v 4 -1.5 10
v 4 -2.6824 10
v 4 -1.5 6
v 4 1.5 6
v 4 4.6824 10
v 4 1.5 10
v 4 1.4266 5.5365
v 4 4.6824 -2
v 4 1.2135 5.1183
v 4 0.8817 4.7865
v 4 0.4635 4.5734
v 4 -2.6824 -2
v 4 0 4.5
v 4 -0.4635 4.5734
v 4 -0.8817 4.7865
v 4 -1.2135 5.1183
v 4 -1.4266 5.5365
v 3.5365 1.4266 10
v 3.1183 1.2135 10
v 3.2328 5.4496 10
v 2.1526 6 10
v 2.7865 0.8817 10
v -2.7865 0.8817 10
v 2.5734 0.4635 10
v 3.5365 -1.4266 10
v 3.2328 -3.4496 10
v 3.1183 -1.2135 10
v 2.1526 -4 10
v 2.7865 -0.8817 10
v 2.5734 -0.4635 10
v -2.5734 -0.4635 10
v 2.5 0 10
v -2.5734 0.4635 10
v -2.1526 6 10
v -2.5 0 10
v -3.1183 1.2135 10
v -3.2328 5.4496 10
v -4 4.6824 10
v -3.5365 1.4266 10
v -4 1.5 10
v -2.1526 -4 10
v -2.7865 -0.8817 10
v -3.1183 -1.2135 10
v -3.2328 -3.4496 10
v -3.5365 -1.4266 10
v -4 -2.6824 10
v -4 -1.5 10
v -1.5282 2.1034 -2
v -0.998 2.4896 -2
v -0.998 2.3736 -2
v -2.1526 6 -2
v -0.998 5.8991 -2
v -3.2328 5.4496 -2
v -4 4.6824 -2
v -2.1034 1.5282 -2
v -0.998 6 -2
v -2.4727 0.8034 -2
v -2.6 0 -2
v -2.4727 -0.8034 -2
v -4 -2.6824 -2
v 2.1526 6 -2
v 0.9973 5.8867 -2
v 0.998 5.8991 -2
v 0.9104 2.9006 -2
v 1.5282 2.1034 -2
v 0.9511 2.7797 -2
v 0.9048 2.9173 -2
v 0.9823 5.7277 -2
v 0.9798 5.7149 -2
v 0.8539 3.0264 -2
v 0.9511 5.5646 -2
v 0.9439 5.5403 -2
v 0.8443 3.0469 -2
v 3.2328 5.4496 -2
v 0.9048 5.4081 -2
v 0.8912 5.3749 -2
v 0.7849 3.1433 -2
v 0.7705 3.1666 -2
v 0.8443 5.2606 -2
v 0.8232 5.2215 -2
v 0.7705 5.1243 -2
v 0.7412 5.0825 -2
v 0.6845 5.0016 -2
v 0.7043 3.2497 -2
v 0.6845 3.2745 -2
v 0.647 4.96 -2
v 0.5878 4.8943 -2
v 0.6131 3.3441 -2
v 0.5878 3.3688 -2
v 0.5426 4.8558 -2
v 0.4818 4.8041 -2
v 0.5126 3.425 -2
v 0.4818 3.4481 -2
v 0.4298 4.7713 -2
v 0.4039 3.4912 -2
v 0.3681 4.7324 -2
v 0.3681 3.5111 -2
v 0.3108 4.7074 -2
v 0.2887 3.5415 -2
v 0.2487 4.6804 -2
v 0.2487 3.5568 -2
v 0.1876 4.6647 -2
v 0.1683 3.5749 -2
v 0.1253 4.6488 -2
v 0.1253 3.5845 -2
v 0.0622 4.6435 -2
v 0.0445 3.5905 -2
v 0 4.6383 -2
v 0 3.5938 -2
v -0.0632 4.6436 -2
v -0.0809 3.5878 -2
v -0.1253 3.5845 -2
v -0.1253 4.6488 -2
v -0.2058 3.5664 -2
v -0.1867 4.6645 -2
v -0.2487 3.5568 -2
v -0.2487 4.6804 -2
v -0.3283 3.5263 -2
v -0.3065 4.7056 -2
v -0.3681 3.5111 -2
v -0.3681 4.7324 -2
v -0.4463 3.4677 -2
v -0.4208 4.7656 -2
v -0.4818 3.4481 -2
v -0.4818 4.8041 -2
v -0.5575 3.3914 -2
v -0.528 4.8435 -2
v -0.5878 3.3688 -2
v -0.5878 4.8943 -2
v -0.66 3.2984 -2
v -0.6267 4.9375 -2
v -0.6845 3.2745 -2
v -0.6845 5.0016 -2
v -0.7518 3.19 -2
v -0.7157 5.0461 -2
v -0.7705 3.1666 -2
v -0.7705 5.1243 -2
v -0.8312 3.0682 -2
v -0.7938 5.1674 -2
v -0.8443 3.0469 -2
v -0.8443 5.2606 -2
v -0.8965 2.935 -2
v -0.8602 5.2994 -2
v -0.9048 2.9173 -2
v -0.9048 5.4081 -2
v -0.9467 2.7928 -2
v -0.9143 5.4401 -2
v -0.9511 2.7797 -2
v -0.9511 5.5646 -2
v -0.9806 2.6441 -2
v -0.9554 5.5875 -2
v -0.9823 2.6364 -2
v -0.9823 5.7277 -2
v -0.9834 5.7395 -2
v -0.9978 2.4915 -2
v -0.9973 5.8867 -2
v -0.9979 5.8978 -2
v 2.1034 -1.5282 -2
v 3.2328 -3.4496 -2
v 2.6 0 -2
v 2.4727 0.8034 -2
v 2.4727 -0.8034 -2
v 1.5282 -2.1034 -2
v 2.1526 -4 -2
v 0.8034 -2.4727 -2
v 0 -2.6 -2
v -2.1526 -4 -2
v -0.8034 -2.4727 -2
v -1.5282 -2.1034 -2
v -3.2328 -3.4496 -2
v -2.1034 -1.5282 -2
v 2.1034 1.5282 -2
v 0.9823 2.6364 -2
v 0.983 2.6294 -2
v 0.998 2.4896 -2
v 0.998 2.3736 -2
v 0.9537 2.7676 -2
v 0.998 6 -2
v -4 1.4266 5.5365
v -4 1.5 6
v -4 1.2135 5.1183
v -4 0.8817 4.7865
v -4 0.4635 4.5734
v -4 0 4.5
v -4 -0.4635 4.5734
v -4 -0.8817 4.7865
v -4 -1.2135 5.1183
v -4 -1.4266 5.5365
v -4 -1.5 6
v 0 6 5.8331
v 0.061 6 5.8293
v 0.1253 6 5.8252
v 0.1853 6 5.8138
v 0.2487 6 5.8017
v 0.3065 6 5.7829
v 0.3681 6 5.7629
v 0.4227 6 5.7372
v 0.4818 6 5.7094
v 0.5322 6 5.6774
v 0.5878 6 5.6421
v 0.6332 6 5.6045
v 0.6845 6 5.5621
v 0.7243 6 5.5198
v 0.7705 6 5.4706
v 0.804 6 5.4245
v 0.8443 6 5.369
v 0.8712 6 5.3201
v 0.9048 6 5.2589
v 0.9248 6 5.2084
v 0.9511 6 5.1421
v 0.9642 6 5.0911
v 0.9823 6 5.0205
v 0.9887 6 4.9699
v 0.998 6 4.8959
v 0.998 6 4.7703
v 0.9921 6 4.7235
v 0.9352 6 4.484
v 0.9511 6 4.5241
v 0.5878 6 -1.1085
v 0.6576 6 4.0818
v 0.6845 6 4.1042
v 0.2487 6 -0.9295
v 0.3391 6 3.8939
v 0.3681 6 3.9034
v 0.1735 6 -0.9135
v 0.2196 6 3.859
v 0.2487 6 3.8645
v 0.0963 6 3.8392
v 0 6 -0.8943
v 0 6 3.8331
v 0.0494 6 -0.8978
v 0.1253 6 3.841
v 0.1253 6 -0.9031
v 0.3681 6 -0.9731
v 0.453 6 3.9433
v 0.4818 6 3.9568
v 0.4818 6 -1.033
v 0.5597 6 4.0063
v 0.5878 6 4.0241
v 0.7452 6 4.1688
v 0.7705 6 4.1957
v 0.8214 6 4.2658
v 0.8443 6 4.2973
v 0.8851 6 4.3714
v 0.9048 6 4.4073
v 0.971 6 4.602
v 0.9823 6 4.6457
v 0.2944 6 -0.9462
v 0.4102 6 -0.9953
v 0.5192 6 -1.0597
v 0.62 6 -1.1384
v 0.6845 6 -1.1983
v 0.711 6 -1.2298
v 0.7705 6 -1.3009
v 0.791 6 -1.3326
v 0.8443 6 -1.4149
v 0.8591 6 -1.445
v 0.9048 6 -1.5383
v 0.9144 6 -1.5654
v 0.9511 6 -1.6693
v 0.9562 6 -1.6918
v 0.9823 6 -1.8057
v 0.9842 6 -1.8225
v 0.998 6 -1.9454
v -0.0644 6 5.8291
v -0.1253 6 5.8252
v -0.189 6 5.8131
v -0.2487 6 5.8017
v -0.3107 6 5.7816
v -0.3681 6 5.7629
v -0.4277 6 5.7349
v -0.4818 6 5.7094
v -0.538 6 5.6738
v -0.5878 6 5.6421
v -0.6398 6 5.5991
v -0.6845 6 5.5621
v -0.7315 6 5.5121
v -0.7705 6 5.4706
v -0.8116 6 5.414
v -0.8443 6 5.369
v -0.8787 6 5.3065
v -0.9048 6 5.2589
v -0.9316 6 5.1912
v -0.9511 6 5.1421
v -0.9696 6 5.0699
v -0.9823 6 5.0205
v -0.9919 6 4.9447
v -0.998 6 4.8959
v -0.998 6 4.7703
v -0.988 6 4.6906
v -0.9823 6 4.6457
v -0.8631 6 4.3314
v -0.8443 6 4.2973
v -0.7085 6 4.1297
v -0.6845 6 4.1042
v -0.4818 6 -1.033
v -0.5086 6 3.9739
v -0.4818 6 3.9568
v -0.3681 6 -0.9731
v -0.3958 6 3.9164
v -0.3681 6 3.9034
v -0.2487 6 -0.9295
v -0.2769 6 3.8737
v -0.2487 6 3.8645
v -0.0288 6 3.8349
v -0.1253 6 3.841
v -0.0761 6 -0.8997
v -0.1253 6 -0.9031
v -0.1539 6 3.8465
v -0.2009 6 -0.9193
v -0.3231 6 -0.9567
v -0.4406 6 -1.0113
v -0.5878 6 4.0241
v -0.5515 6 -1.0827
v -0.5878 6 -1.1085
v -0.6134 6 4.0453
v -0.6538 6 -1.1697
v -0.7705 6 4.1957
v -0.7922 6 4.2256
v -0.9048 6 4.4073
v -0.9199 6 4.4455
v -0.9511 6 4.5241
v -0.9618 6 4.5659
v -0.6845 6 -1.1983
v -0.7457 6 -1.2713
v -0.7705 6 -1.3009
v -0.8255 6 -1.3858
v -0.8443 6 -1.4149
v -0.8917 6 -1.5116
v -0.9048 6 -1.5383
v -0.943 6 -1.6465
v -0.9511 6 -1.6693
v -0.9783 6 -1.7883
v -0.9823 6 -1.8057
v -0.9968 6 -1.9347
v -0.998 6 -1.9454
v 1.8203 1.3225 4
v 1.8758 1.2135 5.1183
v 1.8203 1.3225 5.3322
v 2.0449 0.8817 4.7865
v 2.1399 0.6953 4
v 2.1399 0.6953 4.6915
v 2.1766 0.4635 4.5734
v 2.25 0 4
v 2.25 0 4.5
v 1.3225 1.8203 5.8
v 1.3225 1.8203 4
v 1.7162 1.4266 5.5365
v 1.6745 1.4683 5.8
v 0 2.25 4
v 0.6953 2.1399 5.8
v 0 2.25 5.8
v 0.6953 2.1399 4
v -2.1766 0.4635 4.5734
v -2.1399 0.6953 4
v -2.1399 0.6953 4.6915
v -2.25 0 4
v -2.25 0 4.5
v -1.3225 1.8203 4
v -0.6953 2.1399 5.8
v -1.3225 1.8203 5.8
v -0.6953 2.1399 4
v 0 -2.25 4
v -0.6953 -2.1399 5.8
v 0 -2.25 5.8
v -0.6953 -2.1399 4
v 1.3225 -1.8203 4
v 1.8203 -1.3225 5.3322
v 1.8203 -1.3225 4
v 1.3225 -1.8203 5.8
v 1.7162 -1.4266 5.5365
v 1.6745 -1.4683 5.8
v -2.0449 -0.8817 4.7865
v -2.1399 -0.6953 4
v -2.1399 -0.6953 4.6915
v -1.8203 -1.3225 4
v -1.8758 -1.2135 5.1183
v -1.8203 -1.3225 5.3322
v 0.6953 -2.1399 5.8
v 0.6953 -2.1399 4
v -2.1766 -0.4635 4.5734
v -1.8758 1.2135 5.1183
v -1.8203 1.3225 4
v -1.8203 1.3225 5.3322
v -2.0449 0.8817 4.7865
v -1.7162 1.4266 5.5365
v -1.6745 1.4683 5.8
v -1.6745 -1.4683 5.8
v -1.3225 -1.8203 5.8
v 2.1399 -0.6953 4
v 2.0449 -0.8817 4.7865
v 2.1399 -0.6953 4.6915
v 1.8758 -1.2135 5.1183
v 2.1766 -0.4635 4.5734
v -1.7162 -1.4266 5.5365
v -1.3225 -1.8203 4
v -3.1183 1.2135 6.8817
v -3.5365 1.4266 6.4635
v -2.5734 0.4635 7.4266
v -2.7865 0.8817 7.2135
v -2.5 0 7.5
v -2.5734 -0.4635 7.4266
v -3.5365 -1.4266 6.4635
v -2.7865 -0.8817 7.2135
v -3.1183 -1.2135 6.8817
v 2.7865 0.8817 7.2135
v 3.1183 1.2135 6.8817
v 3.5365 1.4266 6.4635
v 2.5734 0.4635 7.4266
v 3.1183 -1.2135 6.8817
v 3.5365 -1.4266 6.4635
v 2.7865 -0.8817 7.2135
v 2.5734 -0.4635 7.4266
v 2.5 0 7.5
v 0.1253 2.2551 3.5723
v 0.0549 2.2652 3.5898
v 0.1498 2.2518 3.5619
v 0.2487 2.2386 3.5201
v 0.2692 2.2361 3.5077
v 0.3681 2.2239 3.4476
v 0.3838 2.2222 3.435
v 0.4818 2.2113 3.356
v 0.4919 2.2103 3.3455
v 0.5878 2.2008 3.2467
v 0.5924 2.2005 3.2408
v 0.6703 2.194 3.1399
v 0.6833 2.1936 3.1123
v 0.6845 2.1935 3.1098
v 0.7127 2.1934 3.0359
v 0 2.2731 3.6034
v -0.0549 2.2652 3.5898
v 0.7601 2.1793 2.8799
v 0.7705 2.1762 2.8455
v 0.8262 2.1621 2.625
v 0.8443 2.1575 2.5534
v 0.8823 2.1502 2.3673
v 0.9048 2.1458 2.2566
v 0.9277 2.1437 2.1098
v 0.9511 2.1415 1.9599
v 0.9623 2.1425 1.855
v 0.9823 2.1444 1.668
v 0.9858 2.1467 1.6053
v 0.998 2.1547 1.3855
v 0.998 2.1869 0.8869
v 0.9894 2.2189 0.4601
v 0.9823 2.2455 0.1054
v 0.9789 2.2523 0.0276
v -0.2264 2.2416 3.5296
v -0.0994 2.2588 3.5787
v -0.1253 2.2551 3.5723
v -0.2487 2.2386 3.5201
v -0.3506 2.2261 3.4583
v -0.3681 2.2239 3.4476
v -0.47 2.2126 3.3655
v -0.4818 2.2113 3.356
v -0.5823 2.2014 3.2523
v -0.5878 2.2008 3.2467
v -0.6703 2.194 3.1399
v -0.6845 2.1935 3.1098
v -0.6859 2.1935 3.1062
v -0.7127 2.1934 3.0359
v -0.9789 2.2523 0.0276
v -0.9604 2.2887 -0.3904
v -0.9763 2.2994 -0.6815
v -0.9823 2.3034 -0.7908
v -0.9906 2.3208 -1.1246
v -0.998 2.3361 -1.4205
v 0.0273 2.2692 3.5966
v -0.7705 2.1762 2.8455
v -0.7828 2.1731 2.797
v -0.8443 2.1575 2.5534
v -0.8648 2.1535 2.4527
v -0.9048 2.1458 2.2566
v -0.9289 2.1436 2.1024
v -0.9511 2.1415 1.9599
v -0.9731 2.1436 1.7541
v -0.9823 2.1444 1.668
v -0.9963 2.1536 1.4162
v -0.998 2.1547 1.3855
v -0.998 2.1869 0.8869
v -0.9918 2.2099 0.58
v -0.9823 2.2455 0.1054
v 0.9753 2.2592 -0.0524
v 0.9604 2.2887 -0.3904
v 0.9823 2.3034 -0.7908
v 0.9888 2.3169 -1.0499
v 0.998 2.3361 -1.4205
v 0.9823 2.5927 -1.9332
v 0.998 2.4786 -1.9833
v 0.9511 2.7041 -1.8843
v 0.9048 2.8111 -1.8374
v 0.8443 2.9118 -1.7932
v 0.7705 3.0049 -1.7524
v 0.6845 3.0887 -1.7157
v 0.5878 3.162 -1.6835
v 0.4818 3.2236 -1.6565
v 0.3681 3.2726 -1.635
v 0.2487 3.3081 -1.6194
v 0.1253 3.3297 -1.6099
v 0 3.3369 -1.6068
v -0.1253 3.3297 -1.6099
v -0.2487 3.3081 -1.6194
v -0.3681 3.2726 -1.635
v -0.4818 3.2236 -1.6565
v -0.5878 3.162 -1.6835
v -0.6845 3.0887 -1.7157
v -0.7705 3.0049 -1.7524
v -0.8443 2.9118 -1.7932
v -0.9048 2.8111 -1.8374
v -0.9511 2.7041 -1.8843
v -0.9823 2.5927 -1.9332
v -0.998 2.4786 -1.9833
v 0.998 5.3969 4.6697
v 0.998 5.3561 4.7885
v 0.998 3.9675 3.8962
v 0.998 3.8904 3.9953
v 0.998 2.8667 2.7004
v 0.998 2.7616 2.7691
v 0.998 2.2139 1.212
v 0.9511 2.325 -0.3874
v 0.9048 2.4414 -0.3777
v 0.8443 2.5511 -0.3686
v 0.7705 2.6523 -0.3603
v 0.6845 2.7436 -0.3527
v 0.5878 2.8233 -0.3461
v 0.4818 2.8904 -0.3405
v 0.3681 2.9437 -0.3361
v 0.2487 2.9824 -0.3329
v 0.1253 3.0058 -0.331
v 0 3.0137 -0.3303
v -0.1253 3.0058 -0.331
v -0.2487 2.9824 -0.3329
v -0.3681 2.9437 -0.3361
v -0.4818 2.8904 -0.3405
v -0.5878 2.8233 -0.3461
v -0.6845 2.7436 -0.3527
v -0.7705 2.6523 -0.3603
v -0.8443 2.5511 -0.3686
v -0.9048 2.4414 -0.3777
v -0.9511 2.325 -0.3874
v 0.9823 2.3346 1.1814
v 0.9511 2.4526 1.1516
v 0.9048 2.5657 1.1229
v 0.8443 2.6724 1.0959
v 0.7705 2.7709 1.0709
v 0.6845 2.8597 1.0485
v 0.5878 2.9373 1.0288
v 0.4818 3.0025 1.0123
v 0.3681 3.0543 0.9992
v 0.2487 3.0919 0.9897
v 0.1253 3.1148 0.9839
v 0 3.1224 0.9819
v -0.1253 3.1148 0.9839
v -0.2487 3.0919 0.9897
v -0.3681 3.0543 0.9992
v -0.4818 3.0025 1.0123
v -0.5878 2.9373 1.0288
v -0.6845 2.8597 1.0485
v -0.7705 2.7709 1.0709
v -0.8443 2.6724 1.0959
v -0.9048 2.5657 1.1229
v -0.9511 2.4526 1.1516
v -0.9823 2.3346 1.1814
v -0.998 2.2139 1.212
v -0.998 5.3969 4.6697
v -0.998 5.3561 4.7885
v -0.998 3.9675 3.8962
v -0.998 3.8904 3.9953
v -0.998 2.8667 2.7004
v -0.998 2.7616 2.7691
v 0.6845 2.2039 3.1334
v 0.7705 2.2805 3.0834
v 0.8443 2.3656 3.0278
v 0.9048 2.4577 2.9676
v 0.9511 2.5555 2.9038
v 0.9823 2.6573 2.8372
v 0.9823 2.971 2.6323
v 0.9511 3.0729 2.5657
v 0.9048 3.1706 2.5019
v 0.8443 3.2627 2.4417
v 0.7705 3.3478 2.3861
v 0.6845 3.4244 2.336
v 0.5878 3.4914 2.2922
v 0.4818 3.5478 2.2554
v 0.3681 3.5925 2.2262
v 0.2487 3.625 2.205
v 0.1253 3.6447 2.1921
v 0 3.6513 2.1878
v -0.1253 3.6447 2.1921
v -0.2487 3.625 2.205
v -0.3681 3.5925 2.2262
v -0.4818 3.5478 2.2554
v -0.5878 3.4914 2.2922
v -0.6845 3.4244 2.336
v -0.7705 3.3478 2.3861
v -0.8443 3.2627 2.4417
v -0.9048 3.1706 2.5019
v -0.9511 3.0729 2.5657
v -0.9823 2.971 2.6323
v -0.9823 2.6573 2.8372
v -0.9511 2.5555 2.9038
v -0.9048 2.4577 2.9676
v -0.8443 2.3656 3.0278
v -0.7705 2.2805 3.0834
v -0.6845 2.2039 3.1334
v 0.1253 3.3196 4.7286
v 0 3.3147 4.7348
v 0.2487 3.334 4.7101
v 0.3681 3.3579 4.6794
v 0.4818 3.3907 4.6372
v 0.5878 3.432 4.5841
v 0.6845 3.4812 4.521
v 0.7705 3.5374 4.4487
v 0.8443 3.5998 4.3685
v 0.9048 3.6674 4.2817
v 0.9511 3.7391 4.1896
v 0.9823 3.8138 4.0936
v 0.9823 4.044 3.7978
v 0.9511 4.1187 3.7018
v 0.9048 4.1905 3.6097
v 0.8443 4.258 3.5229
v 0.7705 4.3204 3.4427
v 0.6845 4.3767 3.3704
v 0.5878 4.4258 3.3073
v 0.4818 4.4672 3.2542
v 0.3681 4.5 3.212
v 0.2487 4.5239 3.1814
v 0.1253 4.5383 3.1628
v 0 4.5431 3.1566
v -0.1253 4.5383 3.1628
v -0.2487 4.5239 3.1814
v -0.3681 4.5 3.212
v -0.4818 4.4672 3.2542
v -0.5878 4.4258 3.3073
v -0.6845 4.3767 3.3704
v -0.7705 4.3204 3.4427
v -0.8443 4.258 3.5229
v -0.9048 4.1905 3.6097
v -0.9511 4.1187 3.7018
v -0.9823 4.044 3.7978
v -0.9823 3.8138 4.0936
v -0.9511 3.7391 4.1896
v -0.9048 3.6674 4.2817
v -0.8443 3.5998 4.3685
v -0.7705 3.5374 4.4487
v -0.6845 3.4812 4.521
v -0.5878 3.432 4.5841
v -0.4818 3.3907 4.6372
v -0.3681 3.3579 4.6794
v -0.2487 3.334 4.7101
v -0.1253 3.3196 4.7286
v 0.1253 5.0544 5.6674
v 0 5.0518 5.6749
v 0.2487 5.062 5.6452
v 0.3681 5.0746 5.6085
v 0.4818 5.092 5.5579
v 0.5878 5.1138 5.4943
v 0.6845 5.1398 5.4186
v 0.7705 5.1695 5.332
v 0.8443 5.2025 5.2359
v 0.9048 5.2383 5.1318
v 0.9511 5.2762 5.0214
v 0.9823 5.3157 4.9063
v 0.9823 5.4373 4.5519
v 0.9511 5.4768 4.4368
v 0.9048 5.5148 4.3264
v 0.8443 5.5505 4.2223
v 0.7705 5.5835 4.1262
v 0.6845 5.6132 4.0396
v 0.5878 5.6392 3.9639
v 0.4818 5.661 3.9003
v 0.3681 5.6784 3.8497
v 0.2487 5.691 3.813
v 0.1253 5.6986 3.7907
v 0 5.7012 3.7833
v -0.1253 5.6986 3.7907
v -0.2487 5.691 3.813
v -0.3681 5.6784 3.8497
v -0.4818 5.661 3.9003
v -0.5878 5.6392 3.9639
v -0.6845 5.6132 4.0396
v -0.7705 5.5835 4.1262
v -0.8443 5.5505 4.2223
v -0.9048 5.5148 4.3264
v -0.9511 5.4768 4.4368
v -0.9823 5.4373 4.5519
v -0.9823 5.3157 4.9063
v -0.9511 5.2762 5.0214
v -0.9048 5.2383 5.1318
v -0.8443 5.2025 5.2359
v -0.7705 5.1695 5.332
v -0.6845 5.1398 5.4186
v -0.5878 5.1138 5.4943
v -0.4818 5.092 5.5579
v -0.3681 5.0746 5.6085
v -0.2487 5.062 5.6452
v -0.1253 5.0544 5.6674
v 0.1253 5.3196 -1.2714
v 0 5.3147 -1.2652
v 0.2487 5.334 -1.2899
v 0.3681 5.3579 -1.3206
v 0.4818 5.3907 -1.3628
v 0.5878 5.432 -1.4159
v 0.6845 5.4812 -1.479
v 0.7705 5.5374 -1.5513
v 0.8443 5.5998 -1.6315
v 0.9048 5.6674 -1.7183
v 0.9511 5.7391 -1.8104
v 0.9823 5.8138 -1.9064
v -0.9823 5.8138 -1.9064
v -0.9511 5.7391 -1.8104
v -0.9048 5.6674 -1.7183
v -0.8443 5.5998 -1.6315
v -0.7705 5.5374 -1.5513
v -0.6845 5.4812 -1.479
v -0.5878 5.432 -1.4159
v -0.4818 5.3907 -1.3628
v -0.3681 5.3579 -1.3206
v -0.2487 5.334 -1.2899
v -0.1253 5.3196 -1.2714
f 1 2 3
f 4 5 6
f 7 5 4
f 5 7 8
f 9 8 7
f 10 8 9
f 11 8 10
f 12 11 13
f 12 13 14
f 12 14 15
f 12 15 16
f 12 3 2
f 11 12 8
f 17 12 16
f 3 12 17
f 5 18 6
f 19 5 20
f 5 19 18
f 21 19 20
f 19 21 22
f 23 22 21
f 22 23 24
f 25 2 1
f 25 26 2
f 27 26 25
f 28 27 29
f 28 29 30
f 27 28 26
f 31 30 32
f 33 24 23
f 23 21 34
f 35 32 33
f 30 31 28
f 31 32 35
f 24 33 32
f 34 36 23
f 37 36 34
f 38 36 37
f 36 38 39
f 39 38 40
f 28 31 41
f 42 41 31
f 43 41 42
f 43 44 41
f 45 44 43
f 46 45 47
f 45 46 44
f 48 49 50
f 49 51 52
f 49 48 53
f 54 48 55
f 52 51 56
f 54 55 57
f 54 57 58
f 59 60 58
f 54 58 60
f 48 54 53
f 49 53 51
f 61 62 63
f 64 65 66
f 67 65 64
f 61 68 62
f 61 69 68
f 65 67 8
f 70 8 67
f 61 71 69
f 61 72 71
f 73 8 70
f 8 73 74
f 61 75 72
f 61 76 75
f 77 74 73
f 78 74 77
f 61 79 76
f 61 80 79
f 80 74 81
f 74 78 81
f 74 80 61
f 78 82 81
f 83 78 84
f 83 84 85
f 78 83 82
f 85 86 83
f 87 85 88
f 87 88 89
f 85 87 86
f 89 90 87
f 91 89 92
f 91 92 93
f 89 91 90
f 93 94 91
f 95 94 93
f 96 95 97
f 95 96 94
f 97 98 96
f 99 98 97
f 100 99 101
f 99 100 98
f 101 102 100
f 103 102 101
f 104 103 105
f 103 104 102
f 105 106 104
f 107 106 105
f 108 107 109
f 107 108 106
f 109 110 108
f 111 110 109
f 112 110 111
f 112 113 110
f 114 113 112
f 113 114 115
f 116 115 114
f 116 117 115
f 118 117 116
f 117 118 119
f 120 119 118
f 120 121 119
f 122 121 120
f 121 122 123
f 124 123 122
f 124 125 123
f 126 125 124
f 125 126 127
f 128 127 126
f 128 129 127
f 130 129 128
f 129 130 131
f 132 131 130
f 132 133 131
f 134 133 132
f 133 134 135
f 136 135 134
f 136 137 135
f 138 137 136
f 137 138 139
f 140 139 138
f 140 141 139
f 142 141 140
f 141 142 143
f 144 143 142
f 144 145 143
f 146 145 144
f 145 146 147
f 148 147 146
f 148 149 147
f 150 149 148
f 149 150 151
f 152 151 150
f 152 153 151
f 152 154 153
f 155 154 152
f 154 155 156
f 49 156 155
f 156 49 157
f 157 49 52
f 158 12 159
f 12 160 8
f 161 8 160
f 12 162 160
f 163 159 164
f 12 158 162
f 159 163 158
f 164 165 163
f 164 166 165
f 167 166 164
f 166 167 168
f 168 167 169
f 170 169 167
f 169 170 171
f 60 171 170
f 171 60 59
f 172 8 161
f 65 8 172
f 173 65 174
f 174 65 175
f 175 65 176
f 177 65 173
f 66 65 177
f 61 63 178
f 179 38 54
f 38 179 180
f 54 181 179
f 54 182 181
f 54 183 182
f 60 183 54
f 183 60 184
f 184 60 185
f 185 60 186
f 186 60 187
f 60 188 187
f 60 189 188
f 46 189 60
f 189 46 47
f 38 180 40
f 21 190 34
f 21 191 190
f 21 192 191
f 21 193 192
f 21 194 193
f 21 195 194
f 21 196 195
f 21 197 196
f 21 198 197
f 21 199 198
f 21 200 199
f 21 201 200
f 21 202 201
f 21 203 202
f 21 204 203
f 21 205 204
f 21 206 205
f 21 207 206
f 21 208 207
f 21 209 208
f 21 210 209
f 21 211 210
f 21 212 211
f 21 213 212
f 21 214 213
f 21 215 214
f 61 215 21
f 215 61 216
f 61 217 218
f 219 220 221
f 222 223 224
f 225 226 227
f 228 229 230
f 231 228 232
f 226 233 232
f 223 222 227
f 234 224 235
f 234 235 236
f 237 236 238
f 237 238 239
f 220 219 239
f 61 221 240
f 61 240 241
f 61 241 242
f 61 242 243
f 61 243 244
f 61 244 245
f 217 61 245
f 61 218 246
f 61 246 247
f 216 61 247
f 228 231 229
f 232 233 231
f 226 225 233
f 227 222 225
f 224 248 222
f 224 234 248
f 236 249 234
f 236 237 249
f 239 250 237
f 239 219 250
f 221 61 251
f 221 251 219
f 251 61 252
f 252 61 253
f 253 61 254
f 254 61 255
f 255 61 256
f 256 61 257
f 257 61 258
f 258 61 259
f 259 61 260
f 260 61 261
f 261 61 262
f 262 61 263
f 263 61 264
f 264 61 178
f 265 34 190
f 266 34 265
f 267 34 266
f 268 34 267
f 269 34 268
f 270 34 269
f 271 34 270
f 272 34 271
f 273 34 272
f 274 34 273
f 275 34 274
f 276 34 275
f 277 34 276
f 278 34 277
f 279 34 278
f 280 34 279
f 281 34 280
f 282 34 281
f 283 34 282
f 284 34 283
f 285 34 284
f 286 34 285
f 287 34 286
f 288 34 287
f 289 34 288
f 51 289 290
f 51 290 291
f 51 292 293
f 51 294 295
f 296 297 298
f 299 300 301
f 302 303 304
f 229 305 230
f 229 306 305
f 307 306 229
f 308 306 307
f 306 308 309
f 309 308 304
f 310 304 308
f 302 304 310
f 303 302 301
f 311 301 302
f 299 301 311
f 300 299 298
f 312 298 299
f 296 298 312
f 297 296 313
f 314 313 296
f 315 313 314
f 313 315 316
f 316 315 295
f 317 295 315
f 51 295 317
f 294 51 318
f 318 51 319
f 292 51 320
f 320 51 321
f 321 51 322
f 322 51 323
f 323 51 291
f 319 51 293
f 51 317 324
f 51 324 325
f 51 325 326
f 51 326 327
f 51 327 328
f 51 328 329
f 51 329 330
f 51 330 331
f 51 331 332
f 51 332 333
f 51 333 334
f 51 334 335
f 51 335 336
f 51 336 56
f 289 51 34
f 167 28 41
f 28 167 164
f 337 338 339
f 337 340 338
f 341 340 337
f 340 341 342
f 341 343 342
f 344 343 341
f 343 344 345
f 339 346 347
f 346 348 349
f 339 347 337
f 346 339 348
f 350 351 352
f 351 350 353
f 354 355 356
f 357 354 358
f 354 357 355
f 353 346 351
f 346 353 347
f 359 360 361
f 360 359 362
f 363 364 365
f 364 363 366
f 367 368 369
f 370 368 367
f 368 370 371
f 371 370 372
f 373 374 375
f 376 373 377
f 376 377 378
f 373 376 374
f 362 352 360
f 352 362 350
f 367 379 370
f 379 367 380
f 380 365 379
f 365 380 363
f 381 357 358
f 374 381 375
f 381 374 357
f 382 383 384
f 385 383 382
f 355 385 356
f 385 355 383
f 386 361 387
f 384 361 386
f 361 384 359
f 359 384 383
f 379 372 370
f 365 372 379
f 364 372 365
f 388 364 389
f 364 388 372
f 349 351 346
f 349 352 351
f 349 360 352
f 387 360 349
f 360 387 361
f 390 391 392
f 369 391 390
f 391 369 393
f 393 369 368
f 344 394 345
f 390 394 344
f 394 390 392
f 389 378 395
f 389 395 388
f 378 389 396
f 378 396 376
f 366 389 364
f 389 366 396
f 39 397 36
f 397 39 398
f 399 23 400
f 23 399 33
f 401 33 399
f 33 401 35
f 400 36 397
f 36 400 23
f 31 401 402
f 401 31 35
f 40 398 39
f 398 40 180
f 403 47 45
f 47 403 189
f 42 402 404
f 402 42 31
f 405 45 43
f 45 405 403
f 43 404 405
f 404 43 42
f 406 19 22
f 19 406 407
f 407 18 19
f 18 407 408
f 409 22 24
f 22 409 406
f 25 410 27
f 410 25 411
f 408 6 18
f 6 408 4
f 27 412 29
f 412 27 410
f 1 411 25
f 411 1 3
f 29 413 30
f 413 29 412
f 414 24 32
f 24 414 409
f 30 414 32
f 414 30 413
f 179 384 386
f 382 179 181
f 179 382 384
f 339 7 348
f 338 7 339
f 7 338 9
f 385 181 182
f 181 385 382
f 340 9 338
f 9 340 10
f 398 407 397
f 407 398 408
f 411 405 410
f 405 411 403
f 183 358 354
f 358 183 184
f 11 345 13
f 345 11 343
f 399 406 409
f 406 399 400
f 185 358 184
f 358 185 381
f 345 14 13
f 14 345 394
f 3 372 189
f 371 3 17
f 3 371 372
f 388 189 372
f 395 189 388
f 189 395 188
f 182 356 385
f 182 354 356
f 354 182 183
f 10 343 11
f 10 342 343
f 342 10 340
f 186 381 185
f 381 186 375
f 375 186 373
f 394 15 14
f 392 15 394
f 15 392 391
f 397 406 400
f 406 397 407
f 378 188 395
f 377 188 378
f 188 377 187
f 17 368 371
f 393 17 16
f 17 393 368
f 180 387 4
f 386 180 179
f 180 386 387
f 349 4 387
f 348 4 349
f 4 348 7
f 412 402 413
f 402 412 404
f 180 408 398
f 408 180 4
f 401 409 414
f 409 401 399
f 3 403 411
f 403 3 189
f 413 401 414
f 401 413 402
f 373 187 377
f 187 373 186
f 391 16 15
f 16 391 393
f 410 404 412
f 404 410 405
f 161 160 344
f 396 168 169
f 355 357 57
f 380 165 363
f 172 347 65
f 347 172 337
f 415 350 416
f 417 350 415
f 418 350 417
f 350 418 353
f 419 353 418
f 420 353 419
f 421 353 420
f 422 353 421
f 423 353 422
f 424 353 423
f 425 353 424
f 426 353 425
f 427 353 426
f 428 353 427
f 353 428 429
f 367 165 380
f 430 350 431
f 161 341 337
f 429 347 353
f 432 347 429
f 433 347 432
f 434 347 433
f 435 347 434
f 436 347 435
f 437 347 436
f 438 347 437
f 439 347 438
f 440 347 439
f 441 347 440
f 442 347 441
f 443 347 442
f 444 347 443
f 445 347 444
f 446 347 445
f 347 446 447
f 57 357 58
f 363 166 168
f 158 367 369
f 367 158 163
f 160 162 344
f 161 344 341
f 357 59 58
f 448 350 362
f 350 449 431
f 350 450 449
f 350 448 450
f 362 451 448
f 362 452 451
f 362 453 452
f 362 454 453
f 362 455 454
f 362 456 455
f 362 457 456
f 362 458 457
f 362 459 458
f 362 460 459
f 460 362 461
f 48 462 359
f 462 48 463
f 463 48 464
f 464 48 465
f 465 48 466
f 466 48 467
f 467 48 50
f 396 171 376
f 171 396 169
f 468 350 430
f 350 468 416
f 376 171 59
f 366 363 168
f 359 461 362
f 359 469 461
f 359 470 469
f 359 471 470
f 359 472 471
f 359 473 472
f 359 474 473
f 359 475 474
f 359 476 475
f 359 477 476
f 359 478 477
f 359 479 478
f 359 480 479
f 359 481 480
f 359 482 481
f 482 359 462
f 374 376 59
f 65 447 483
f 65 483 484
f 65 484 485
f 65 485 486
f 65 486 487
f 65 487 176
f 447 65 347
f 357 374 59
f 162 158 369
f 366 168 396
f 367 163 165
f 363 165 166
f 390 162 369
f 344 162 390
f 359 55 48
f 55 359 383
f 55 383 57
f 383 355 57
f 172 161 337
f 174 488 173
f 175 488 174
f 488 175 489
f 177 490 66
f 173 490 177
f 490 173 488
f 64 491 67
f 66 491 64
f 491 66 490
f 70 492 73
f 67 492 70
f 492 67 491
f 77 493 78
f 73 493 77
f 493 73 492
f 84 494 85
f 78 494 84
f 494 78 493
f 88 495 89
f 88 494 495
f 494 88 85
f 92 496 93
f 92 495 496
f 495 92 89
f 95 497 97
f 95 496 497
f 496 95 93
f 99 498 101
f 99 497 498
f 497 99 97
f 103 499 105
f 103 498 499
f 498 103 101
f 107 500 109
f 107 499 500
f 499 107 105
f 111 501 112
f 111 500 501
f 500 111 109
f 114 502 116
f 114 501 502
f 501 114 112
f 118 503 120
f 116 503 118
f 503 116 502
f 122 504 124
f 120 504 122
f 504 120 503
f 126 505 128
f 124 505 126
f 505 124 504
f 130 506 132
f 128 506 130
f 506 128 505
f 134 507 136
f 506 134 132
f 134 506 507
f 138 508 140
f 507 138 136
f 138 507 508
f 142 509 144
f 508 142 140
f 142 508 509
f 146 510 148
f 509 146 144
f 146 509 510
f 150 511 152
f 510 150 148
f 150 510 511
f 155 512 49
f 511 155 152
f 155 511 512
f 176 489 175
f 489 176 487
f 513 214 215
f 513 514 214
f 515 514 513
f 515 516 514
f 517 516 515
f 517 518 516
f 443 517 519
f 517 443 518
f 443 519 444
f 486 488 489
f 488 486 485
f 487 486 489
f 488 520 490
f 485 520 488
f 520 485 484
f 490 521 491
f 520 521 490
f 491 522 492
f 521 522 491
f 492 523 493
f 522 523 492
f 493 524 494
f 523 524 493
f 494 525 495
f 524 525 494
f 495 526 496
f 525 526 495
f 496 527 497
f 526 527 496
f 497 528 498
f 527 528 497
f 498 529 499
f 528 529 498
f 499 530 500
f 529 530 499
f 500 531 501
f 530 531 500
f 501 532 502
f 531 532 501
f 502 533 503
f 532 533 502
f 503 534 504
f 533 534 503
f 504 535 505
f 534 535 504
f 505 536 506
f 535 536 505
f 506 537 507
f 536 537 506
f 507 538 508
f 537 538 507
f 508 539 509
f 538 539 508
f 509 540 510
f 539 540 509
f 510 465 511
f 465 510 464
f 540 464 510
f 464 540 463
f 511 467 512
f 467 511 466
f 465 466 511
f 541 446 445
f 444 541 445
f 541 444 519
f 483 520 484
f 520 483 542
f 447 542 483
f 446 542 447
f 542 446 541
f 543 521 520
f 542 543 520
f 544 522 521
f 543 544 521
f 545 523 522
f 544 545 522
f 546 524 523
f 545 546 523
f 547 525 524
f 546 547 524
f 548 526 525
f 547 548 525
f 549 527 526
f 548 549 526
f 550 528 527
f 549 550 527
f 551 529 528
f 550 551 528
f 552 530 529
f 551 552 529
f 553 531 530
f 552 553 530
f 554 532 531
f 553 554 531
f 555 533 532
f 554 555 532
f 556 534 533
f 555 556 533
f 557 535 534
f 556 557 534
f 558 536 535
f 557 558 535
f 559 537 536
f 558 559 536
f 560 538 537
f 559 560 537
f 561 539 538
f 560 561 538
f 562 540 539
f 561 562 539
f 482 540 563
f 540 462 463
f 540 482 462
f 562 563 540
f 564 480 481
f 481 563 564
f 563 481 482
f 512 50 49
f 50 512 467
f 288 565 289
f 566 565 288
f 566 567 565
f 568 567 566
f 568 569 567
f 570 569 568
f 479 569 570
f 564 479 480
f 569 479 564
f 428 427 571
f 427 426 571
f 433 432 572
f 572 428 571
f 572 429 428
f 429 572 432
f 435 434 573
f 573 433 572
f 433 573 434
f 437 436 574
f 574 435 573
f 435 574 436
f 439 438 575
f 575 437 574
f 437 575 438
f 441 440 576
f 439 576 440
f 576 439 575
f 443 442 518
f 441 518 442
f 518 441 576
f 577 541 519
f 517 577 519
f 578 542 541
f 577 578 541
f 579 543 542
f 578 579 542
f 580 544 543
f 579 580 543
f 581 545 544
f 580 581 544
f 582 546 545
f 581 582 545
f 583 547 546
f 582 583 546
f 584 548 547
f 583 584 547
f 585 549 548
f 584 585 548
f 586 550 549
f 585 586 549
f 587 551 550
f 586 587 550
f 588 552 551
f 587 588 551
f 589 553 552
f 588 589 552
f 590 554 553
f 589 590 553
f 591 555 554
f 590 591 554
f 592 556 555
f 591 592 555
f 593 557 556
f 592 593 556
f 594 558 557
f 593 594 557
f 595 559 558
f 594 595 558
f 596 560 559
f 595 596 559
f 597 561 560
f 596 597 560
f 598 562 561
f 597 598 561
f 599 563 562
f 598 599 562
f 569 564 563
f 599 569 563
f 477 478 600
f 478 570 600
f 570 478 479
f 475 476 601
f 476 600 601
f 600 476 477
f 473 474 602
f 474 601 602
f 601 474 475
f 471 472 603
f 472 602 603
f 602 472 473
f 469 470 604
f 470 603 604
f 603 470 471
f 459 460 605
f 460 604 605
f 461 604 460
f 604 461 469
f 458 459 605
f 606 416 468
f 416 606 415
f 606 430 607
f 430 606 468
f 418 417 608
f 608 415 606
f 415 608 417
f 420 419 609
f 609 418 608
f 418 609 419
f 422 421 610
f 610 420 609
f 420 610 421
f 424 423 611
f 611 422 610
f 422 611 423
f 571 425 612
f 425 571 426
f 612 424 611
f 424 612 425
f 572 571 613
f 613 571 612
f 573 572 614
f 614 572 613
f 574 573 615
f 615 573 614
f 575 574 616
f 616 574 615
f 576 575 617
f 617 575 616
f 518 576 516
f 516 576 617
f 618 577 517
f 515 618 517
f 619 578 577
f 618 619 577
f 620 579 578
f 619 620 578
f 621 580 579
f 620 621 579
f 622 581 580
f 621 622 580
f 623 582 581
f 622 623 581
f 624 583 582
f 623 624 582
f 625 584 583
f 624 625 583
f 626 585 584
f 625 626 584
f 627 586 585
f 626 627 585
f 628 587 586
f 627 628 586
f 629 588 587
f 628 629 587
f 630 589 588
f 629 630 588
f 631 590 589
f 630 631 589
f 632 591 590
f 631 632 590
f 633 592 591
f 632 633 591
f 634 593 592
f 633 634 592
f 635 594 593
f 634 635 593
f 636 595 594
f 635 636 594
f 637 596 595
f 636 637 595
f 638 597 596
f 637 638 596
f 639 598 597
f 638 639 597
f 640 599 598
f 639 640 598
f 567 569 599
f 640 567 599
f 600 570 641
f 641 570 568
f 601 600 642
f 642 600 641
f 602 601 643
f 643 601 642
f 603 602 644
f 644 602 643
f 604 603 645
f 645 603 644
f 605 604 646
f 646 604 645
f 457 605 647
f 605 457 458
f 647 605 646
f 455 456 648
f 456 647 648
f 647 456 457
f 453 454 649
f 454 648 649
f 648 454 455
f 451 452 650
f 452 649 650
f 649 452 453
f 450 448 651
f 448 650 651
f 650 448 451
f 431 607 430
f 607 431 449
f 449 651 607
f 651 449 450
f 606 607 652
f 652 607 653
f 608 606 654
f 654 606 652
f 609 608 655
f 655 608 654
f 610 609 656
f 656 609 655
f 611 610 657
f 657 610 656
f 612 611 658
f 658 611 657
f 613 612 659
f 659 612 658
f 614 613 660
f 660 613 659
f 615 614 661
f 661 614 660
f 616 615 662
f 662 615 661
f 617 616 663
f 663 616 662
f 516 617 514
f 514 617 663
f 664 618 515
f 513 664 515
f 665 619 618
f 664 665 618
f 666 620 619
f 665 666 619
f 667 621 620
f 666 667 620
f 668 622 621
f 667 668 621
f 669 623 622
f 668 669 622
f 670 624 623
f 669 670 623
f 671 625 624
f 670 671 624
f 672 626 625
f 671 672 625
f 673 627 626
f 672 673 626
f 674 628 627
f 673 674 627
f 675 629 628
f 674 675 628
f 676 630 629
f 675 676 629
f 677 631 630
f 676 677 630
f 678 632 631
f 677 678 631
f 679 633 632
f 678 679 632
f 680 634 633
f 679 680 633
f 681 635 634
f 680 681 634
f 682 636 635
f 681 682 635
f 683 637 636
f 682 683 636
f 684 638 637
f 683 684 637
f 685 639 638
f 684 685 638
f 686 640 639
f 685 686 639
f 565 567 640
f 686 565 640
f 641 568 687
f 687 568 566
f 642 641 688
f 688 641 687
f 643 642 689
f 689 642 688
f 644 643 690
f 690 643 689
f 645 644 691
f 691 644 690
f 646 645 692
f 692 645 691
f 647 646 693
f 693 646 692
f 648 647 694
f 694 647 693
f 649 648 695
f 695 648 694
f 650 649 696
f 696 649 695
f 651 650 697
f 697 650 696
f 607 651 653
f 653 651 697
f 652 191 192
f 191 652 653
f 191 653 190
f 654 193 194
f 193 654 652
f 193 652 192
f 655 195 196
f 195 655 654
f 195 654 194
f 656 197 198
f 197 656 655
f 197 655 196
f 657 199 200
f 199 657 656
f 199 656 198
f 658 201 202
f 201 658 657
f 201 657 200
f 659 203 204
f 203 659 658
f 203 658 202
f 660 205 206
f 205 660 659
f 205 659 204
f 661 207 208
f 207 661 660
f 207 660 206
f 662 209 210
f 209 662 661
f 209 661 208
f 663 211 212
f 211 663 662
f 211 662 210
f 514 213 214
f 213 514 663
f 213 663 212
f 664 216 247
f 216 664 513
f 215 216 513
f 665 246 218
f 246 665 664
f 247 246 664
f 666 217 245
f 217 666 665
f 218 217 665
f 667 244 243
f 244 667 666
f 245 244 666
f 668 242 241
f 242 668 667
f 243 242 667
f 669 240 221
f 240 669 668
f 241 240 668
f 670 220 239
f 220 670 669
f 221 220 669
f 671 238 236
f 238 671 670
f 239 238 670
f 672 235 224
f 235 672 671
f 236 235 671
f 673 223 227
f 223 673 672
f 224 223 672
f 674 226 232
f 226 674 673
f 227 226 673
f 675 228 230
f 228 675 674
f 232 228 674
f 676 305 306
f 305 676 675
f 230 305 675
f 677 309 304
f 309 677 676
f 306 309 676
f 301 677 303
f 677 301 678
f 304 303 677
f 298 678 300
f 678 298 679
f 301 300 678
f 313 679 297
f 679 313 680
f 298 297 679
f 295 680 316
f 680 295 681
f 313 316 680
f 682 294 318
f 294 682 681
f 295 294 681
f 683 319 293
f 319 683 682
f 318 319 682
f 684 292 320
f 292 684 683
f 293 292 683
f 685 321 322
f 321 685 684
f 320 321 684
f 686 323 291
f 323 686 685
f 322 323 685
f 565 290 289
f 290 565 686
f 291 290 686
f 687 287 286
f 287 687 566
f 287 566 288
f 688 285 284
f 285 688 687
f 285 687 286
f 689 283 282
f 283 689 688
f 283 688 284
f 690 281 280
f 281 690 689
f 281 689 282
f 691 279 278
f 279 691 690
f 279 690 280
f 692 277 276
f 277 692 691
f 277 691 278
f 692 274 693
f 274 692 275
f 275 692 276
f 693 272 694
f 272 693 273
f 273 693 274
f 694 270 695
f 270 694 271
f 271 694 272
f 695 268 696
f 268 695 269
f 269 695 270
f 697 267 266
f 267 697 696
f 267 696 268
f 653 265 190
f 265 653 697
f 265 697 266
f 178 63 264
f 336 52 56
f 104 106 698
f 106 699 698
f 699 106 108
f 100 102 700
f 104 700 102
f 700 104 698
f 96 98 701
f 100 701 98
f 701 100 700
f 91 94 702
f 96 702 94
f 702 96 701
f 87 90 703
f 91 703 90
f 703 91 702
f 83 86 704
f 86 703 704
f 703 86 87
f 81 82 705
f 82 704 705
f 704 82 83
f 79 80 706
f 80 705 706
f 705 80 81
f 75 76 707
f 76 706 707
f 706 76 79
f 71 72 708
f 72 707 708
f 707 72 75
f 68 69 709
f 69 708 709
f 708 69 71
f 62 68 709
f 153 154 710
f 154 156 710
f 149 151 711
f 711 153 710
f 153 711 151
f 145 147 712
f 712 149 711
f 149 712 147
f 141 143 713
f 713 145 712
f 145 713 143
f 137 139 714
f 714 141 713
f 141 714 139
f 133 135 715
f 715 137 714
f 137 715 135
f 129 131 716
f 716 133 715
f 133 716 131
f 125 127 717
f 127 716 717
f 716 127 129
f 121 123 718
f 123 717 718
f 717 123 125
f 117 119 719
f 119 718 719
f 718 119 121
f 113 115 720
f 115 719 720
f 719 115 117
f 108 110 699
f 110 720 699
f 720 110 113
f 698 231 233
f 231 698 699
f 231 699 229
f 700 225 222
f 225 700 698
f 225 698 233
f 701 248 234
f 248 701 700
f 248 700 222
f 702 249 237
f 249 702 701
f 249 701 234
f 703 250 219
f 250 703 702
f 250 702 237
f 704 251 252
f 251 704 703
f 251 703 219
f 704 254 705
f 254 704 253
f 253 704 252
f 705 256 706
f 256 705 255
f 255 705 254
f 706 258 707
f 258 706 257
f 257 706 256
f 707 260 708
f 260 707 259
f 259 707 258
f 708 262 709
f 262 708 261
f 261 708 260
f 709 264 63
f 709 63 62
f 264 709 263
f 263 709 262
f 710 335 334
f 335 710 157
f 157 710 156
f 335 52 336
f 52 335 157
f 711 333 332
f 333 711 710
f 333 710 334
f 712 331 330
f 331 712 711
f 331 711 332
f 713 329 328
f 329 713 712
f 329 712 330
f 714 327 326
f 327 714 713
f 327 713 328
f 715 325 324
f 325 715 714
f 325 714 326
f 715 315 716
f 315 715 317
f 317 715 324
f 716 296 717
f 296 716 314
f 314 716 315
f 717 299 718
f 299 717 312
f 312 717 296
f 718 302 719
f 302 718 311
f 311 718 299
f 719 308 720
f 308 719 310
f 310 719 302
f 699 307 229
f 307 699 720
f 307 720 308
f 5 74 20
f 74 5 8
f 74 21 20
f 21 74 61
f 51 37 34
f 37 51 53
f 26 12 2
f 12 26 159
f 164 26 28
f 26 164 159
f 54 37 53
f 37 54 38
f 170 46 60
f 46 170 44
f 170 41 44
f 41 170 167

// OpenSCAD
module sadapt(){
    
    intersection(){ translate([0, 1, -4]) cylinder(h = 50, d = 11, $fn = 20);
difference(){
    translate([-4, -4, -2]) cube([8, 10, 12]);
    cylinder(h = 5.8, d = 4.5, $fn = 20);
    {translate([-4, 0, 6]) cylinder(h = 20, d = 3, $fn = 20); 
    translate([4, 0, 6]) cylinder(h = 20, d = 3, $fn = 20); 

    translate([-10, 0, 6]) rotate([0, 90, 0]) cylinder(h = 20, d = 3, $fn = 20); 
        }
    //translate([0, 0, -4]) cylinder(h = 5.8, d = 5, $fn = 20);
        translate([0,0, -2]) cylinder(r1 = 5.2/2, r2 = 4.5/2, h = 6, $fn = 20);
        //translate([0, 2.5, -3]) cylinder(h = 20, d = 1.5, $fn = 30);
        translate([0, 7, 0])
rotate([0, 90, 0])
rotate_extrude(convexity = 20)
translate([5, 0, 0])
circle(r = 1, $fn = 50);
        
        translate([0, 9, -6])
rotate([0, 90, 0])
rotate_extrude(convexity = 20)
translate([5, 0, 0])
circle(r = 1, $fn = 50);
    }
}

}
sadapt(); 
